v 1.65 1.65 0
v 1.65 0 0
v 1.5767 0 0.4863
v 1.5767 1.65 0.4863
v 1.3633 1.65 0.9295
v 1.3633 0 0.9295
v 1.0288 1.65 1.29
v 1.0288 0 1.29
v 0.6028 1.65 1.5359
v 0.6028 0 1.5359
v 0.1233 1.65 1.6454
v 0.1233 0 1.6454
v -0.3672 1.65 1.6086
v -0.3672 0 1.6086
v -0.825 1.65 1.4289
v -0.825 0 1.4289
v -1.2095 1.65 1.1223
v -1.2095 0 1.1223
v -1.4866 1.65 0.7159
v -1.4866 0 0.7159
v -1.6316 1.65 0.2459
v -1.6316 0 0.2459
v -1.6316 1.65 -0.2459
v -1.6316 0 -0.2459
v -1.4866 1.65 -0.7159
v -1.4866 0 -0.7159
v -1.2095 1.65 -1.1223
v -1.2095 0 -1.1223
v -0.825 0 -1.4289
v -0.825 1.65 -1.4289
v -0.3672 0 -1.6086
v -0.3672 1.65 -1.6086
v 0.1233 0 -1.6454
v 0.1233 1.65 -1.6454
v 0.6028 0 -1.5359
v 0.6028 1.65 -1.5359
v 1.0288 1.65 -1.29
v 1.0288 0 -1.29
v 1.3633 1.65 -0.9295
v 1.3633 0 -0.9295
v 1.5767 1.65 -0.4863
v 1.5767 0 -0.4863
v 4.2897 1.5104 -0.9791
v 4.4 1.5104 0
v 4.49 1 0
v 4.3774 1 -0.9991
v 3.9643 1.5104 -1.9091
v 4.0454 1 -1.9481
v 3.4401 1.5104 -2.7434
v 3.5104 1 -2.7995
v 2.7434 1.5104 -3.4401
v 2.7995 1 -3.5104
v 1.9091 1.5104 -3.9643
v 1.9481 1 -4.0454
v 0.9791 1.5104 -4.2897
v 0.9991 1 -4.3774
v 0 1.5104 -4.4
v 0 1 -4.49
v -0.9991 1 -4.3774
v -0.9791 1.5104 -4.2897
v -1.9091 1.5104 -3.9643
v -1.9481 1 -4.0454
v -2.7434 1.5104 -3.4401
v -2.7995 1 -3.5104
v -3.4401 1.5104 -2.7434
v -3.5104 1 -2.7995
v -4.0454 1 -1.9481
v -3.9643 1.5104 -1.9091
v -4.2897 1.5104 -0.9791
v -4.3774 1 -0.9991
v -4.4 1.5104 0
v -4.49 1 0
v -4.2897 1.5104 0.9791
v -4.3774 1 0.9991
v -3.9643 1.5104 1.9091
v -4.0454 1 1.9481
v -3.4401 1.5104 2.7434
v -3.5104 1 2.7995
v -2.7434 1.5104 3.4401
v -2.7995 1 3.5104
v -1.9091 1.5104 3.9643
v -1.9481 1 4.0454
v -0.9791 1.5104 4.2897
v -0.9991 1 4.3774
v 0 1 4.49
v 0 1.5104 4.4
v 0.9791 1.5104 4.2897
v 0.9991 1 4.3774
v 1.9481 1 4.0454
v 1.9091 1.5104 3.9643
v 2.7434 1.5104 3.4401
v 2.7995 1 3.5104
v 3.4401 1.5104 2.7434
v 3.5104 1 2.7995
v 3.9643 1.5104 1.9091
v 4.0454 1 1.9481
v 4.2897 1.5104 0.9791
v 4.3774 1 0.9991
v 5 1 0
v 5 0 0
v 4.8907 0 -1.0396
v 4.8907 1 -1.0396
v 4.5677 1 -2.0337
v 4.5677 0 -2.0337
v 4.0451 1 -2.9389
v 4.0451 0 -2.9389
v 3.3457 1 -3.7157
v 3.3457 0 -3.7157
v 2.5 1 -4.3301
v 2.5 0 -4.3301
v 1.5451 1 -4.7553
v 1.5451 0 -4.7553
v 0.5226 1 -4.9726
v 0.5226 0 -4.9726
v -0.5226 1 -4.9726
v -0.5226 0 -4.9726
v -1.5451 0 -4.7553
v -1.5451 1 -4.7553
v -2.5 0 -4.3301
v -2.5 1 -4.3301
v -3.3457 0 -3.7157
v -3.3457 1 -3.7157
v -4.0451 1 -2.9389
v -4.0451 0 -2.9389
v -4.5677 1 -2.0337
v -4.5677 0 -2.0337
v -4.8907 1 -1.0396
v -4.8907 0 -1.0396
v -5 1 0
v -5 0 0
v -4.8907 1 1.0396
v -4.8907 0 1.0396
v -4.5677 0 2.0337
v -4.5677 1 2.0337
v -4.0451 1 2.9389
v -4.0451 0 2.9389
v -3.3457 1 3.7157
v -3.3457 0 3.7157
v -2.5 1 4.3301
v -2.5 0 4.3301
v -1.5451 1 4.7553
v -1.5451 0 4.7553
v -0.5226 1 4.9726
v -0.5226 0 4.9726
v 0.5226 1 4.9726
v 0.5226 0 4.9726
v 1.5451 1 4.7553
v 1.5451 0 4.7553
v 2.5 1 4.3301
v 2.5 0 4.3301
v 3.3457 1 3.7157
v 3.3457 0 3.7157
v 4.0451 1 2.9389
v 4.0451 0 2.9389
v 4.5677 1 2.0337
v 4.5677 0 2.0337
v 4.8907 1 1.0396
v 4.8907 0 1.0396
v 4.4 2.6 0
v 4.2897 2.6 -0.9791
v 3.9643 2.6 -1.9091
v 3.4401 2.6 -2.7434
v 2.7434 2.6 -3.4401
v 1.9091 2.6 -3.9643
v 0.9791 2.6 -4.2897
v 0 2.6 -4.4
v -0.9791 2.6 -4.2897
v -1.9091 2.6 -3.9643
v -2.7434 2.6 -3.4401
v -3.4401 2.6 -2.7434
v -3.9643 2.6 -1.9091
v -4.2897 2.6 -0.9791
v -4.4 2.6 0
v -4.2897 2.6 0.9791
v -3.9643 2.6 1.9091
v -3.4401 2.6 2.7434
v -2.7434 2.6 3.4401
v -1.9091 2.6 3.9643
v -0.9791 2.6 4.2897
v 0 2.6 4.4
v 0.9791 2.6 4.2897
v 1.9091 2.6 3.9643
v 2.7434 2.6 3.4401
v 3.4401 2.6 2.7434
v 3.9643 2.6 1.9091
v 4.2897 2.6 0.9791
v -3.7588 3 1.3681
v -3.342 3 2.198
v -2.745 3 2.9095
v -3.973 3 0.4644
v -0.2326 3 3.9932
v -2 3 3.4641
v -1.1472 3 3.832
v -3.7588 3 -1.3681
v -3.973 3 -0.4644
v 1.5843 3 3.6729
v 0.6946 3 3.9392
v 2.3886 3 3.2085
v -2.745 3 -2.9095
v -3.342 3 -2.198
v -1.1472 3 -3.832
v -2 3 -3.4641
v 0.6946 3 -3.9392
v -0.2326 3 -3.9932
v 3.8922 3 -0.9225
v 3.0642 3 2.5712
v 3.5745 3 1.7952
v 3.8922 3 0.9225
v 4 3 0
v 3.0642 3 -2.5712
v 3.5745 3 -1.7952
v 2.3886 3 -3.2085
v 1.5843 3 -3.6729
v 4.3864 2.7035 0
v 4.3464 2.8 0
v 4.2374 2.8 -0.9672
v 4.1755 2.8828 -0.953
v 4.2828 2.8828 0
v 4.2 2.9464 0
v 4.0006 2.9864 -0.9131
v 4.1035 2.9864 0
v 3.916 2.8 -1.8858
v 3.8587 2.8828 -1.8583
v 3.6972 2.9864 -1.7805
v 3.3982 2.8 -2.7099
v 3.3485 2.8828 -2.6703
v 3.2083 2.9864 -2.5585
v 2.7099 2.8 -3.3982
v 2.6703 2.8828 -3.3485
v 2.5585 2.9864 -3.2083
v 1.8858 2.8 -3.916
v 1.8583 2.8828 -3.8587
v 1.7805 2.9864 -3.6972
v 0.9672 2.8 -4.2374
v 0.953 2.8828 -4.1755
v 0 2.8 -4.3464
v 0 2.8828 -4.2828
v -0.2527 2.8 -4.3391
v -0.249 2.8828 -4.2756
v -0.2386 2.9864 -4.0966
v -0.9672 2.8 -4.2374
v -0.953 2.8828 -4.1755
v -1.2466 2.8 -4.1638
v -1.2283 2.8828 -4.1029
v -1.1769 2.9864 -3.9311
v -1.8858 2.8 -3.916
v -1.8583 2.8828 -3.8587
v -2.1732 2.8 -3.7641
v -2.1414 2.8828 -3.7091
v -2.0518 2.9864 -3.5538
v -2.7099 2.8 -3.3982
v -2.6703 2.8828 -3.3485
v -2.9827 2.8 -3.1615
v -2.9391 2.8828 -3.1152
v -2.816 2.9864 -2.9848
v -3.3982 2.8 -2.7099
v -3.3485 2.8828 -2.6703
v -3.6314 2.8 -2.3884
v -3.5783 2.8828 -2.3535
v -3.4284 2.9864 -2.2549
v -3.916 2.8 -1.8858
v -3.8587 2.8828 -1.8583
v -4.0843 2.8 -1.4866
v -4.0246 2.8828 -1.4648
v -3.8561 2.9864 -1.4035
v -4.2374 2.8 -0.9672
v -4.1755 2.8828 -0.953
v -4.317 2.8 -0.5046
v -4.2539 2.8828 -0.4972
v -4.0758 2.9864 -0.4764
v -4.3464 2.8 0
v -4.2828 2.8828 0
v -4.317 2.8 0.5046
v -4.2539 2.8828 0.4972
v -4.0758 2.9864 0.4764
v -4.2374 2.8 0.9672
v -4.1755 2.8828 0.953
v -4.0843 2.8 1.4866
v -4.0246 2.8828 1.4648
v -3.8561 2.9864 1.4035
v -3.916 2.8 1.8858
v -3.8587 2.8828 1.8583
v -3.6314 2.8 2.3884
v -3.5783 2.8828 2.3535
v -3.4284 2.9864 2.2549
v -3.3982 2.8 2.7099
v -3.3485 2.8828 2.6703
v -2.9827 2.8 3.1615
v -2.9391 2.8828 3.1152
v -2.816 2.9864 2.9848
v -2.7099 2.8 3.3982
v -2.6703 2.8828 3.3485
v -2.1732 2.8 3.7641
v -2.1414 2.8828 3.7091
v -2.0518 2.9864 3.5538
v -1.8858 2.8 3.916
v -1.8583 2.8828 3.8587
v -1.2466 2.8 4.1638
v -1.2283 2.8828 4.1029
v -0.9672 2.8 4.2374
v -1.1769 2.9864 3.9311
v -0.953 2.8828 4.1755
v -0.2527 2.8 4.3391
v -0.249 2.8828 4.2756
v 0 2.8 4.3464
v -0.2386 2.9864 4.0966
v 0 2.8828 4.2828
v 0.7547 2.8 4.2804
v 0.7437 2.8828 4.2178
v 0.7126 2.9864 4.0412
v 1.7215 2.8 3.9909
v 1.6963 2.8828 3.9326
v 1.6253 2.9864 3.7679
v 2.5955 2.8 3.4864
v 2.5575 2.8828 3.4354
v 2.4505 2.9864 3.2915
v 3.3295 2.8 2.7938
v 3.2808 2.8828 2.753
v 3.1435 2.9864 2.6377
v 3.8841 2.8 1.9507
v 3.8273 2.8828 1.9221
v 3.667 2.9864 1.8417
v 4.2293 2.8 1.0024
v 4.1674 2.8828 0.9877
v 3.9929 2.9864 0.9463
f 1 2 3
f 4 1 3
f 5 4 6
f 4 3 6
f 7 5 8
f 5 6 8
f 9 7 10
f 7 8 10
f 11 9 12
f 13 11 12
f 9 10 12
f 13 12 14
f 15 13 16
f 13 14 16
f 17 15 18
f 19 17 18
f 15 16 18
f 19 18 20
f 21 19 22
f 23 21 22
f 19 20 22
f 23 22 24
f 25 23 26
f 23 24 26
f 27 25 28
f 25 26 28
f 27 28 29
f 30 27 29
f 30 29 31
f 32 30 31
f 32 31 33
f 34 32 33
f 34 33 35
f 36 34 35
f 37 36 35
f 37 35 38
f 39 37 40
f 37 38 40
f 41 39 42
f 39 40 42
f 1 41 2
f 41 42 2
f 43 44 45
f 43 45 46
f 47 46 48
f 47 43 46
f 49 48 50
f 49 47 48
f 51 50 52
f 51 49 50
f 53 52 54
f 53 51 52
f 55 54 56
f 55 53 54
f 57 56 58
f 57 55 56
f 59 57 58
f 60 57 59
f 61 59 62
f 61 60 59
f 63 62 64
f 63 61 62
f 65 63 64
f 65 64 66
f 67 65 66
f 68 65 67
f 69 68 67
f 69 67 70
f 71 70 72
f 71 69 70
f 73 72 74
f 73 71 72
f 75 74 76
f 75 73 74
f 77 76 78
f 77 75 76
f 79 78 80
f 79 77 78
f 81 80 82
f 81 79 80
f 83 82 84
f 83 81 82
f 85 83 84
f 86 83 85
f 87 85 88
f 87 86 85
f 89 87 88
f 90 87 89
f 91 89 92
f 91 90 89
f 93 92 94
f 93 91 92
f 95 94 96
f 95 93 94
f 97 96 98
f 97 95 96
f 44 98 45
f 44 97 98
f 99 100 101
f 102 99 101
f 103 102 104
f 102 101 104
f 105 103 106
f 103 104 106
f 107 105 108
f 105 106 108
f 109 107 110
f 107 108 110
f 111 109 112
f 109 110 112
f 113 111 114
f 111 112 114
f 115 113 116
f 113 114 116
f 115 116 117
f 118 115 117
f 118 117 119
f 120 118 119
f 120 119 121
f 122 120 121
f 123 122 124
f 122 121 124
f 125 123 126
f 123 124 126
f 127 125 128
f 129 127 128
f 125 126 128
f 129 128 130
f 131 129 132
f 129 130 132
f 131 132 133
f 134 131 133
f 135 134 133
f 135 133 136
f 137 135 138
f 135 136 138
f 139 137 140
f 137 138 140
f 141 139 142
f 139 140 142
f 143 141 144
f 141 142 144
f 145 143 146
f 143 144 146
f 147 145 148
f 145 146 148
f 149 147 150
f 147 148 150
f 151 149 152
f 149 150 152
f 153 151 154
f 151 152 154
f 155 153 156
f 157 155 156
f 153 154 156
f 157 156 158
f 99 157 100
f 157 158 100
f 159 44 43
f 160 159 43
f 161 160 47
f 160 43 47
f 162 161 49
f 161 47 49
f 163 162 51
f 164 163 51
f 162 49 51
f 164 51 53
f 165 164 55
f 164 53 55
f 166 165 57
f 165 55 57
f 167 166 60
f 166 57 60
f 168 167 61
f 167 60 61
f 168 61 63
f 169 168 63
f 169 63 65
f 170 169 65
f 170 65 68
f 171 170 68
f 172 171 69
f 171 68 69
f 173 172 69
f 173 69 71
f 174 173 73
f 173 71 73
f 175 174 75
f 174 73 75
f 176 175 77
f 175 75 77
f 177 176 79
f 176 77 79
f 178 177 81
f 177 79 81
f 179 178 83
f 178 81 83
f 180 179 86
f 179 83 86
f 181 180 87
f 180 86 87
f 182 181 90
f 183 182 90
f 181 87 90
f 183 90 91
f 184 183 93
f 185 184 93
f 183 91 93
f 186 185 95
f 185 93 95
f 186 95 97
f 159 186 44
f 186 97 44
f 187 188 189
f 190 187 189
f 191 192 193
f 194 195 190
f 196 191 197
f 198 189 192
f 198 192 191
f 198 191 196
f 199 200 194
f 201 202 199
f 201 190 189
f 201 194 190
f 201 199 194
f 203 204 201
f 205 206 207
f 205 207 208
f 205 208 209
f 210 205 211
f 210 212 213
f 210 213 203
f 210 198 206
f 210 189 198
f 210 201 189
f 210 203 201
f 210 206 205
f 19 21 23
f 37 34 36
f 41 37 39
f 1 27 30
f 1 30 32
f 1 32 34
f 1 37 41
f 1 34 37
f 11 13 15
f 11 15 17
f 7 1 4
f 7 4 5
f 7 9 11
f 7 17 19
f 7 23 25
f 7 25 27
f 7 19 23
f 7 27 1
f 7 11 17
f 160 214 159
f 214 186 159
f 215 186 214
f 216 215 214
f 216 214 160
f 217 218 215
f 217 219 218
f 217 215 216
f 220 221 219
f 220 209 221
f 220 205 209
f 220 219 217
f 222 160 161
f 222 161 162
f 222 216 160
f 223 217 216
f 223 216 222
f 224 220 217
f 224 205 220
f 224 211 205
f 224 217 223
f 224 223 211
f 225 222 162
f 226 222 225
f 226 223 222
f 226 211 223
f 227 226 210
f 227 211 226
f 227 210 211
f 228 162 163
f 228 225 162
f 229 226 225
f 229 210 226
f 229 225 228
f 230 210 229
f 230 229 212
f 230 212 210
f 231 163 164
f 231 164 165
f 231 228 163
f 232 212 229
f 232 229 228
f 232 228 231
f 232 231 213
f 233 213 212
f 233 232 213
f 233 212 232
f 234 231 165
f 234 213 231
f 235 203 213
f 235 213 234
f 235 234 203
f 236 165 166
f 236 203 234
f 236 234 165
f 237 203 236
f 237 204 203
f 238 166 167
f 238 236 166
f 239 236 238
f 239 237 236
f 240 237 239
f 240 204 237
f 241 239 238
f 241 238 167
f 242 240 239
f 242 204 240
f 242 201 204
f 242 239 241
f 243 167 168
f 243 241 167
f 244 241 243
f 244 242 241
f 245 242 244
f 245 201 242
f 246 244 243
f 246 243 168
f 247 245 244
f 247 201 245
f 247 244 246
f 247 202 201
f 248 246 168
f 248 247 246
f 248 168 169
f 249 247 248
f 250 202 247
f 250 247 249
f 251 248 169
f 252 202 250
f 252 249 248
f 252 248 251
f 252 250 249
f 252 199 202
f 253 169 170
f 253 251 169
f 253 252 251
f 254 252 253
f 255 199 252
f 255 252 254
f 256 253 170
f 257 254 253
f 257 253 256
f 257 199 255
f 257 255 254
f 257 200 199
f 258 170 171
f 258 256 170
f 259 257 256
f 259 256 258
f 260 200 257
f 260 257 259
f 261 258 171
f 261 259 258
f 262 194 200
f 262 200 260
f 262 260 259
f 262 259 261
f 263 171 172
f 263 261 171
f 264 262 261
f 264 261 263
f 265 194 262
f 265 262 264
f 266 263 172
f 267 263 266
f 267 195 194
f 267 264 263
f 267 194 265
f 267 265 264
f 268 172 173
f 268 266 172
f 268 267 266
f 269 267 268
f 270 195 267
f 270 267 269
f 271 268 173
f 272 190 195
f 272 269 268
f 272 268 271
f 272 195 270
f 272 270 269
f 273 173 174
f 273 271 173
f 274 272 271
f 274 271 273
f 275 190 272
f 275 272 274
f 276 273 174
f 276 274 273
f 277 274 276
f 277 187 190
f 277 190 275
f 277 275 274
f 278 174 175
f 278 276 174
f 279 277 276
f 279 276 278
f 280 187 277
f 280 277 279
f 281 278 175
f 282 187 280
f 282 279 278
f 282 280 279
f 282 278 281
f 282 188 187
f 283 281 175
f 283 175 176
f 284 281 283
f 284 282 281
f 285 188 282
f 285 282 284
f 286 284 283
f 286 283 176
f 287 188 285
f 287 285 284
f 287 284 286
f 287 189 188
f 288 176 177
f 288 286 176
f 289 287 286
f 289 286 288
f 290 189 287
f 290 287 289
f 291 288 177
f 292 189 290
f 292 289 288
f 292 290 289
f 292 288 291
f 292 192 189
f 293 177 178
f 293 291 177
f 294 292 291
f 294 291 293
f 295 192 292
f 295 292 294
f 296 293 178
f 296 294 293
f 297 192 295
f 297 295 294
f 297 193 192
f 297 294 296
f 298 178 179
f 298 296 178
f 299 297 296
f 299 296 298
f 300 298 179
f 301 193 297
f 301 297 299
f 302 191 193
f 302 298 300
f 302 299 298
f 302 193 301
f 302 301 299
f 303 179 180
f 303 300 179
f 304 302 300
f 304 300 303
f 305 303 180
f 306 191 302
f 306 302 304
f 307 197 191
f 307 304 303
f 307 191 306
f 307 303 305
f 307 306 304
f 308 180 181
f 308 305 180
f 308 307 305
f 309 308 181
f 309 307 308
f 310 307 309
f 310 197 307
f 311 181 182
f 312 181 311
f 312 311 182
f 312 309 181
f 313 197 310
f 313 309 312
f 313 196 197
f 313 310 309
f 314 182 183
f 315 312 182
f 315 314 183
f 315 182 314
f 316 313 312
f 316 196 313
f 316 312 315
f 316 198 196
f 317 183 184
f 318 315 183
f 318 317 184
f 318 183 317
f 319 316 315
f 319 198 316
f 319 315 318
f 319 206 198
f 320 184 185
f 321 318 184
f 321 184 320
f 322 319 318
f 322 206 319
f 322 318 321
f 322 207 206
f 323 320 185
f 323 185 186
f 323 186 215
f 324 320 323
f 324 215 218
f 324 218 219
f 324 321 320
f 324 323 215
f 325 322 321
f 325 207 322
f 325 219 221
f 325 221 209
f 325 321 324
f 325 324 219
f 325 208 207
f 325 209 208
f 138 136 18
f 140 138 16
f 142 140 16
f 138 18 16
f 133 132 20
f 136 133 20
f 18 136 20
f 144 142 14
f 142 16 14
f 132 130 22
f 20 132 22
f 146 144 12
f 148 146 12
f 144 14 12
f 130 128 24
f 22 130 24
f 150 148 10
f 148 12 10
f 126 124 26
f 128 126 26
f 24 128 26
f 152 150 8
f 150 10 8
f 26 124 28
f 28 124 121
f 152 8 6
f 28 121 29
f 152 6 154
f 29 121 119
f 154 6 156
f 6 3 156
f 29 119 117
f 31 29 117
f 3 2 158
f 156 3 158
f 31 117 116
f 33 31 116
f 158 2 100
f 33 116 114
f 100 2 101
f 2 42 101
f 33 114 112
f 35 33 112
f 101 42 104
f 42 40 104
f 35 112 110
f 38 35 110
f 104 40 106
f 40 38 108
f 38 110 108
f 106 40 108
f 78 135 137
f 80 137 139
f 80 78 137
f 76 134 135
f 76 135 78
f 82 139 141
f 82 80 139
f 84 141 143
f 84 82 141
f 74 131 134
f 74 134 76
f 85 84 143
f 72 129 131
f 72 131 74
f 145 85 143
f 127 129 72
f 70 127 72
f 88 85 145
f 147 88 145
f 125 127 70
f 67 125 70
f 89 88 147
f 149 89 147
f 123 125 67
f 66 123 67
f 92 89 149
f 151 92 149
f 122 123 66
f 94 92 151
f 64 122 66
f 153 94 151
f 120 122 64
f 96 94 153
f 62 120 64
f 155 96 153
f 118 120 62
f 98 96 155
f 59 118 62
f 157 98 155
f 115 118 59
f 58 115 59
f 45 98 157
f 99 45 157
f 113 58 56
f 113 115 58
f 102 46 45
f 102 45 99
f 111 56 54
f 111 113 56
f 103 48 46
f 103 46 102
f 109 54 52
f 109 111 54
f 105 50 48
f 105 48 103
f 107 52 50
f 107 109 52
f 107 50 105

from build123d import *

# Parameters (mm, degrees)
SKETCH_2_R          = 5
EXTRUDE_1_DEPTH     = 1
SKETCH_3_R          = 4.4
EXTRUDE_2_DEPTH     = 2
FILLET_1_R          = 0.4
CHAMFER_1_SIZE      = 0.09
CHAMFER_1_SIZE2     = 0.510415364
SKETCH_4_R          = 1.65
CUT_EXTRUDE_1_DEPTH = 1.65


with BuildPart() as part:
    # 草图2 → 凸台-拉伸1 (new body)
    with BuildSketch(Plane(origin=(0, 0, 0), x_dir=(1, 0, 0), z_dir=(0, 1, 0))):
        Circle(SKETCH_2_R)
    extrude(amount=EXTRUDE_1_DEPTH)

    # 草图3 → 凸台-拉伸2 (add)
    with BuildSketch(Plane(origin=(0, 1, 0), x_dir=(1, 0, 0), z_dir=(0, 1, 0))):
        Circle(SKETCH_3_R)
    extrude(amount=EXTRUDE_2_DEPTH)

    # 圆角1
    fillet_1_edges = [part.edges().sort_by_distance(p)[0] for p in [
        (-4.4, 3, 0),
    ]]
    fillet(fillet_1_edges, radius=FILLET_1_R)

    # 倒角1
    chamfer_1_edges = [part.edges().sort_by_distance(p)[0] for p in [
        (-4.4, 1, 0),
    ]]
    chamfer_1_side = [part.faces().sort_by_distance(p)[0] for p in [
        (-4.858578644, 1, 0),
    ]]
    chamfer(chamfer_1_edges, length=CHAMFER_1_SIZE, length2=CHAMFER_1_SIZE2, reference=chamfer_1_side[0])

    # 草图4 → 切除-拉伸1 (cut)
    with BuildSketch(Plane.XZ):
        Circle(SKETCH_4_R)
    extrude(amount=-CUT_EXTRUDE_1_DEPTH, mode=Mode.SUBTRACT)


solid = part.part
